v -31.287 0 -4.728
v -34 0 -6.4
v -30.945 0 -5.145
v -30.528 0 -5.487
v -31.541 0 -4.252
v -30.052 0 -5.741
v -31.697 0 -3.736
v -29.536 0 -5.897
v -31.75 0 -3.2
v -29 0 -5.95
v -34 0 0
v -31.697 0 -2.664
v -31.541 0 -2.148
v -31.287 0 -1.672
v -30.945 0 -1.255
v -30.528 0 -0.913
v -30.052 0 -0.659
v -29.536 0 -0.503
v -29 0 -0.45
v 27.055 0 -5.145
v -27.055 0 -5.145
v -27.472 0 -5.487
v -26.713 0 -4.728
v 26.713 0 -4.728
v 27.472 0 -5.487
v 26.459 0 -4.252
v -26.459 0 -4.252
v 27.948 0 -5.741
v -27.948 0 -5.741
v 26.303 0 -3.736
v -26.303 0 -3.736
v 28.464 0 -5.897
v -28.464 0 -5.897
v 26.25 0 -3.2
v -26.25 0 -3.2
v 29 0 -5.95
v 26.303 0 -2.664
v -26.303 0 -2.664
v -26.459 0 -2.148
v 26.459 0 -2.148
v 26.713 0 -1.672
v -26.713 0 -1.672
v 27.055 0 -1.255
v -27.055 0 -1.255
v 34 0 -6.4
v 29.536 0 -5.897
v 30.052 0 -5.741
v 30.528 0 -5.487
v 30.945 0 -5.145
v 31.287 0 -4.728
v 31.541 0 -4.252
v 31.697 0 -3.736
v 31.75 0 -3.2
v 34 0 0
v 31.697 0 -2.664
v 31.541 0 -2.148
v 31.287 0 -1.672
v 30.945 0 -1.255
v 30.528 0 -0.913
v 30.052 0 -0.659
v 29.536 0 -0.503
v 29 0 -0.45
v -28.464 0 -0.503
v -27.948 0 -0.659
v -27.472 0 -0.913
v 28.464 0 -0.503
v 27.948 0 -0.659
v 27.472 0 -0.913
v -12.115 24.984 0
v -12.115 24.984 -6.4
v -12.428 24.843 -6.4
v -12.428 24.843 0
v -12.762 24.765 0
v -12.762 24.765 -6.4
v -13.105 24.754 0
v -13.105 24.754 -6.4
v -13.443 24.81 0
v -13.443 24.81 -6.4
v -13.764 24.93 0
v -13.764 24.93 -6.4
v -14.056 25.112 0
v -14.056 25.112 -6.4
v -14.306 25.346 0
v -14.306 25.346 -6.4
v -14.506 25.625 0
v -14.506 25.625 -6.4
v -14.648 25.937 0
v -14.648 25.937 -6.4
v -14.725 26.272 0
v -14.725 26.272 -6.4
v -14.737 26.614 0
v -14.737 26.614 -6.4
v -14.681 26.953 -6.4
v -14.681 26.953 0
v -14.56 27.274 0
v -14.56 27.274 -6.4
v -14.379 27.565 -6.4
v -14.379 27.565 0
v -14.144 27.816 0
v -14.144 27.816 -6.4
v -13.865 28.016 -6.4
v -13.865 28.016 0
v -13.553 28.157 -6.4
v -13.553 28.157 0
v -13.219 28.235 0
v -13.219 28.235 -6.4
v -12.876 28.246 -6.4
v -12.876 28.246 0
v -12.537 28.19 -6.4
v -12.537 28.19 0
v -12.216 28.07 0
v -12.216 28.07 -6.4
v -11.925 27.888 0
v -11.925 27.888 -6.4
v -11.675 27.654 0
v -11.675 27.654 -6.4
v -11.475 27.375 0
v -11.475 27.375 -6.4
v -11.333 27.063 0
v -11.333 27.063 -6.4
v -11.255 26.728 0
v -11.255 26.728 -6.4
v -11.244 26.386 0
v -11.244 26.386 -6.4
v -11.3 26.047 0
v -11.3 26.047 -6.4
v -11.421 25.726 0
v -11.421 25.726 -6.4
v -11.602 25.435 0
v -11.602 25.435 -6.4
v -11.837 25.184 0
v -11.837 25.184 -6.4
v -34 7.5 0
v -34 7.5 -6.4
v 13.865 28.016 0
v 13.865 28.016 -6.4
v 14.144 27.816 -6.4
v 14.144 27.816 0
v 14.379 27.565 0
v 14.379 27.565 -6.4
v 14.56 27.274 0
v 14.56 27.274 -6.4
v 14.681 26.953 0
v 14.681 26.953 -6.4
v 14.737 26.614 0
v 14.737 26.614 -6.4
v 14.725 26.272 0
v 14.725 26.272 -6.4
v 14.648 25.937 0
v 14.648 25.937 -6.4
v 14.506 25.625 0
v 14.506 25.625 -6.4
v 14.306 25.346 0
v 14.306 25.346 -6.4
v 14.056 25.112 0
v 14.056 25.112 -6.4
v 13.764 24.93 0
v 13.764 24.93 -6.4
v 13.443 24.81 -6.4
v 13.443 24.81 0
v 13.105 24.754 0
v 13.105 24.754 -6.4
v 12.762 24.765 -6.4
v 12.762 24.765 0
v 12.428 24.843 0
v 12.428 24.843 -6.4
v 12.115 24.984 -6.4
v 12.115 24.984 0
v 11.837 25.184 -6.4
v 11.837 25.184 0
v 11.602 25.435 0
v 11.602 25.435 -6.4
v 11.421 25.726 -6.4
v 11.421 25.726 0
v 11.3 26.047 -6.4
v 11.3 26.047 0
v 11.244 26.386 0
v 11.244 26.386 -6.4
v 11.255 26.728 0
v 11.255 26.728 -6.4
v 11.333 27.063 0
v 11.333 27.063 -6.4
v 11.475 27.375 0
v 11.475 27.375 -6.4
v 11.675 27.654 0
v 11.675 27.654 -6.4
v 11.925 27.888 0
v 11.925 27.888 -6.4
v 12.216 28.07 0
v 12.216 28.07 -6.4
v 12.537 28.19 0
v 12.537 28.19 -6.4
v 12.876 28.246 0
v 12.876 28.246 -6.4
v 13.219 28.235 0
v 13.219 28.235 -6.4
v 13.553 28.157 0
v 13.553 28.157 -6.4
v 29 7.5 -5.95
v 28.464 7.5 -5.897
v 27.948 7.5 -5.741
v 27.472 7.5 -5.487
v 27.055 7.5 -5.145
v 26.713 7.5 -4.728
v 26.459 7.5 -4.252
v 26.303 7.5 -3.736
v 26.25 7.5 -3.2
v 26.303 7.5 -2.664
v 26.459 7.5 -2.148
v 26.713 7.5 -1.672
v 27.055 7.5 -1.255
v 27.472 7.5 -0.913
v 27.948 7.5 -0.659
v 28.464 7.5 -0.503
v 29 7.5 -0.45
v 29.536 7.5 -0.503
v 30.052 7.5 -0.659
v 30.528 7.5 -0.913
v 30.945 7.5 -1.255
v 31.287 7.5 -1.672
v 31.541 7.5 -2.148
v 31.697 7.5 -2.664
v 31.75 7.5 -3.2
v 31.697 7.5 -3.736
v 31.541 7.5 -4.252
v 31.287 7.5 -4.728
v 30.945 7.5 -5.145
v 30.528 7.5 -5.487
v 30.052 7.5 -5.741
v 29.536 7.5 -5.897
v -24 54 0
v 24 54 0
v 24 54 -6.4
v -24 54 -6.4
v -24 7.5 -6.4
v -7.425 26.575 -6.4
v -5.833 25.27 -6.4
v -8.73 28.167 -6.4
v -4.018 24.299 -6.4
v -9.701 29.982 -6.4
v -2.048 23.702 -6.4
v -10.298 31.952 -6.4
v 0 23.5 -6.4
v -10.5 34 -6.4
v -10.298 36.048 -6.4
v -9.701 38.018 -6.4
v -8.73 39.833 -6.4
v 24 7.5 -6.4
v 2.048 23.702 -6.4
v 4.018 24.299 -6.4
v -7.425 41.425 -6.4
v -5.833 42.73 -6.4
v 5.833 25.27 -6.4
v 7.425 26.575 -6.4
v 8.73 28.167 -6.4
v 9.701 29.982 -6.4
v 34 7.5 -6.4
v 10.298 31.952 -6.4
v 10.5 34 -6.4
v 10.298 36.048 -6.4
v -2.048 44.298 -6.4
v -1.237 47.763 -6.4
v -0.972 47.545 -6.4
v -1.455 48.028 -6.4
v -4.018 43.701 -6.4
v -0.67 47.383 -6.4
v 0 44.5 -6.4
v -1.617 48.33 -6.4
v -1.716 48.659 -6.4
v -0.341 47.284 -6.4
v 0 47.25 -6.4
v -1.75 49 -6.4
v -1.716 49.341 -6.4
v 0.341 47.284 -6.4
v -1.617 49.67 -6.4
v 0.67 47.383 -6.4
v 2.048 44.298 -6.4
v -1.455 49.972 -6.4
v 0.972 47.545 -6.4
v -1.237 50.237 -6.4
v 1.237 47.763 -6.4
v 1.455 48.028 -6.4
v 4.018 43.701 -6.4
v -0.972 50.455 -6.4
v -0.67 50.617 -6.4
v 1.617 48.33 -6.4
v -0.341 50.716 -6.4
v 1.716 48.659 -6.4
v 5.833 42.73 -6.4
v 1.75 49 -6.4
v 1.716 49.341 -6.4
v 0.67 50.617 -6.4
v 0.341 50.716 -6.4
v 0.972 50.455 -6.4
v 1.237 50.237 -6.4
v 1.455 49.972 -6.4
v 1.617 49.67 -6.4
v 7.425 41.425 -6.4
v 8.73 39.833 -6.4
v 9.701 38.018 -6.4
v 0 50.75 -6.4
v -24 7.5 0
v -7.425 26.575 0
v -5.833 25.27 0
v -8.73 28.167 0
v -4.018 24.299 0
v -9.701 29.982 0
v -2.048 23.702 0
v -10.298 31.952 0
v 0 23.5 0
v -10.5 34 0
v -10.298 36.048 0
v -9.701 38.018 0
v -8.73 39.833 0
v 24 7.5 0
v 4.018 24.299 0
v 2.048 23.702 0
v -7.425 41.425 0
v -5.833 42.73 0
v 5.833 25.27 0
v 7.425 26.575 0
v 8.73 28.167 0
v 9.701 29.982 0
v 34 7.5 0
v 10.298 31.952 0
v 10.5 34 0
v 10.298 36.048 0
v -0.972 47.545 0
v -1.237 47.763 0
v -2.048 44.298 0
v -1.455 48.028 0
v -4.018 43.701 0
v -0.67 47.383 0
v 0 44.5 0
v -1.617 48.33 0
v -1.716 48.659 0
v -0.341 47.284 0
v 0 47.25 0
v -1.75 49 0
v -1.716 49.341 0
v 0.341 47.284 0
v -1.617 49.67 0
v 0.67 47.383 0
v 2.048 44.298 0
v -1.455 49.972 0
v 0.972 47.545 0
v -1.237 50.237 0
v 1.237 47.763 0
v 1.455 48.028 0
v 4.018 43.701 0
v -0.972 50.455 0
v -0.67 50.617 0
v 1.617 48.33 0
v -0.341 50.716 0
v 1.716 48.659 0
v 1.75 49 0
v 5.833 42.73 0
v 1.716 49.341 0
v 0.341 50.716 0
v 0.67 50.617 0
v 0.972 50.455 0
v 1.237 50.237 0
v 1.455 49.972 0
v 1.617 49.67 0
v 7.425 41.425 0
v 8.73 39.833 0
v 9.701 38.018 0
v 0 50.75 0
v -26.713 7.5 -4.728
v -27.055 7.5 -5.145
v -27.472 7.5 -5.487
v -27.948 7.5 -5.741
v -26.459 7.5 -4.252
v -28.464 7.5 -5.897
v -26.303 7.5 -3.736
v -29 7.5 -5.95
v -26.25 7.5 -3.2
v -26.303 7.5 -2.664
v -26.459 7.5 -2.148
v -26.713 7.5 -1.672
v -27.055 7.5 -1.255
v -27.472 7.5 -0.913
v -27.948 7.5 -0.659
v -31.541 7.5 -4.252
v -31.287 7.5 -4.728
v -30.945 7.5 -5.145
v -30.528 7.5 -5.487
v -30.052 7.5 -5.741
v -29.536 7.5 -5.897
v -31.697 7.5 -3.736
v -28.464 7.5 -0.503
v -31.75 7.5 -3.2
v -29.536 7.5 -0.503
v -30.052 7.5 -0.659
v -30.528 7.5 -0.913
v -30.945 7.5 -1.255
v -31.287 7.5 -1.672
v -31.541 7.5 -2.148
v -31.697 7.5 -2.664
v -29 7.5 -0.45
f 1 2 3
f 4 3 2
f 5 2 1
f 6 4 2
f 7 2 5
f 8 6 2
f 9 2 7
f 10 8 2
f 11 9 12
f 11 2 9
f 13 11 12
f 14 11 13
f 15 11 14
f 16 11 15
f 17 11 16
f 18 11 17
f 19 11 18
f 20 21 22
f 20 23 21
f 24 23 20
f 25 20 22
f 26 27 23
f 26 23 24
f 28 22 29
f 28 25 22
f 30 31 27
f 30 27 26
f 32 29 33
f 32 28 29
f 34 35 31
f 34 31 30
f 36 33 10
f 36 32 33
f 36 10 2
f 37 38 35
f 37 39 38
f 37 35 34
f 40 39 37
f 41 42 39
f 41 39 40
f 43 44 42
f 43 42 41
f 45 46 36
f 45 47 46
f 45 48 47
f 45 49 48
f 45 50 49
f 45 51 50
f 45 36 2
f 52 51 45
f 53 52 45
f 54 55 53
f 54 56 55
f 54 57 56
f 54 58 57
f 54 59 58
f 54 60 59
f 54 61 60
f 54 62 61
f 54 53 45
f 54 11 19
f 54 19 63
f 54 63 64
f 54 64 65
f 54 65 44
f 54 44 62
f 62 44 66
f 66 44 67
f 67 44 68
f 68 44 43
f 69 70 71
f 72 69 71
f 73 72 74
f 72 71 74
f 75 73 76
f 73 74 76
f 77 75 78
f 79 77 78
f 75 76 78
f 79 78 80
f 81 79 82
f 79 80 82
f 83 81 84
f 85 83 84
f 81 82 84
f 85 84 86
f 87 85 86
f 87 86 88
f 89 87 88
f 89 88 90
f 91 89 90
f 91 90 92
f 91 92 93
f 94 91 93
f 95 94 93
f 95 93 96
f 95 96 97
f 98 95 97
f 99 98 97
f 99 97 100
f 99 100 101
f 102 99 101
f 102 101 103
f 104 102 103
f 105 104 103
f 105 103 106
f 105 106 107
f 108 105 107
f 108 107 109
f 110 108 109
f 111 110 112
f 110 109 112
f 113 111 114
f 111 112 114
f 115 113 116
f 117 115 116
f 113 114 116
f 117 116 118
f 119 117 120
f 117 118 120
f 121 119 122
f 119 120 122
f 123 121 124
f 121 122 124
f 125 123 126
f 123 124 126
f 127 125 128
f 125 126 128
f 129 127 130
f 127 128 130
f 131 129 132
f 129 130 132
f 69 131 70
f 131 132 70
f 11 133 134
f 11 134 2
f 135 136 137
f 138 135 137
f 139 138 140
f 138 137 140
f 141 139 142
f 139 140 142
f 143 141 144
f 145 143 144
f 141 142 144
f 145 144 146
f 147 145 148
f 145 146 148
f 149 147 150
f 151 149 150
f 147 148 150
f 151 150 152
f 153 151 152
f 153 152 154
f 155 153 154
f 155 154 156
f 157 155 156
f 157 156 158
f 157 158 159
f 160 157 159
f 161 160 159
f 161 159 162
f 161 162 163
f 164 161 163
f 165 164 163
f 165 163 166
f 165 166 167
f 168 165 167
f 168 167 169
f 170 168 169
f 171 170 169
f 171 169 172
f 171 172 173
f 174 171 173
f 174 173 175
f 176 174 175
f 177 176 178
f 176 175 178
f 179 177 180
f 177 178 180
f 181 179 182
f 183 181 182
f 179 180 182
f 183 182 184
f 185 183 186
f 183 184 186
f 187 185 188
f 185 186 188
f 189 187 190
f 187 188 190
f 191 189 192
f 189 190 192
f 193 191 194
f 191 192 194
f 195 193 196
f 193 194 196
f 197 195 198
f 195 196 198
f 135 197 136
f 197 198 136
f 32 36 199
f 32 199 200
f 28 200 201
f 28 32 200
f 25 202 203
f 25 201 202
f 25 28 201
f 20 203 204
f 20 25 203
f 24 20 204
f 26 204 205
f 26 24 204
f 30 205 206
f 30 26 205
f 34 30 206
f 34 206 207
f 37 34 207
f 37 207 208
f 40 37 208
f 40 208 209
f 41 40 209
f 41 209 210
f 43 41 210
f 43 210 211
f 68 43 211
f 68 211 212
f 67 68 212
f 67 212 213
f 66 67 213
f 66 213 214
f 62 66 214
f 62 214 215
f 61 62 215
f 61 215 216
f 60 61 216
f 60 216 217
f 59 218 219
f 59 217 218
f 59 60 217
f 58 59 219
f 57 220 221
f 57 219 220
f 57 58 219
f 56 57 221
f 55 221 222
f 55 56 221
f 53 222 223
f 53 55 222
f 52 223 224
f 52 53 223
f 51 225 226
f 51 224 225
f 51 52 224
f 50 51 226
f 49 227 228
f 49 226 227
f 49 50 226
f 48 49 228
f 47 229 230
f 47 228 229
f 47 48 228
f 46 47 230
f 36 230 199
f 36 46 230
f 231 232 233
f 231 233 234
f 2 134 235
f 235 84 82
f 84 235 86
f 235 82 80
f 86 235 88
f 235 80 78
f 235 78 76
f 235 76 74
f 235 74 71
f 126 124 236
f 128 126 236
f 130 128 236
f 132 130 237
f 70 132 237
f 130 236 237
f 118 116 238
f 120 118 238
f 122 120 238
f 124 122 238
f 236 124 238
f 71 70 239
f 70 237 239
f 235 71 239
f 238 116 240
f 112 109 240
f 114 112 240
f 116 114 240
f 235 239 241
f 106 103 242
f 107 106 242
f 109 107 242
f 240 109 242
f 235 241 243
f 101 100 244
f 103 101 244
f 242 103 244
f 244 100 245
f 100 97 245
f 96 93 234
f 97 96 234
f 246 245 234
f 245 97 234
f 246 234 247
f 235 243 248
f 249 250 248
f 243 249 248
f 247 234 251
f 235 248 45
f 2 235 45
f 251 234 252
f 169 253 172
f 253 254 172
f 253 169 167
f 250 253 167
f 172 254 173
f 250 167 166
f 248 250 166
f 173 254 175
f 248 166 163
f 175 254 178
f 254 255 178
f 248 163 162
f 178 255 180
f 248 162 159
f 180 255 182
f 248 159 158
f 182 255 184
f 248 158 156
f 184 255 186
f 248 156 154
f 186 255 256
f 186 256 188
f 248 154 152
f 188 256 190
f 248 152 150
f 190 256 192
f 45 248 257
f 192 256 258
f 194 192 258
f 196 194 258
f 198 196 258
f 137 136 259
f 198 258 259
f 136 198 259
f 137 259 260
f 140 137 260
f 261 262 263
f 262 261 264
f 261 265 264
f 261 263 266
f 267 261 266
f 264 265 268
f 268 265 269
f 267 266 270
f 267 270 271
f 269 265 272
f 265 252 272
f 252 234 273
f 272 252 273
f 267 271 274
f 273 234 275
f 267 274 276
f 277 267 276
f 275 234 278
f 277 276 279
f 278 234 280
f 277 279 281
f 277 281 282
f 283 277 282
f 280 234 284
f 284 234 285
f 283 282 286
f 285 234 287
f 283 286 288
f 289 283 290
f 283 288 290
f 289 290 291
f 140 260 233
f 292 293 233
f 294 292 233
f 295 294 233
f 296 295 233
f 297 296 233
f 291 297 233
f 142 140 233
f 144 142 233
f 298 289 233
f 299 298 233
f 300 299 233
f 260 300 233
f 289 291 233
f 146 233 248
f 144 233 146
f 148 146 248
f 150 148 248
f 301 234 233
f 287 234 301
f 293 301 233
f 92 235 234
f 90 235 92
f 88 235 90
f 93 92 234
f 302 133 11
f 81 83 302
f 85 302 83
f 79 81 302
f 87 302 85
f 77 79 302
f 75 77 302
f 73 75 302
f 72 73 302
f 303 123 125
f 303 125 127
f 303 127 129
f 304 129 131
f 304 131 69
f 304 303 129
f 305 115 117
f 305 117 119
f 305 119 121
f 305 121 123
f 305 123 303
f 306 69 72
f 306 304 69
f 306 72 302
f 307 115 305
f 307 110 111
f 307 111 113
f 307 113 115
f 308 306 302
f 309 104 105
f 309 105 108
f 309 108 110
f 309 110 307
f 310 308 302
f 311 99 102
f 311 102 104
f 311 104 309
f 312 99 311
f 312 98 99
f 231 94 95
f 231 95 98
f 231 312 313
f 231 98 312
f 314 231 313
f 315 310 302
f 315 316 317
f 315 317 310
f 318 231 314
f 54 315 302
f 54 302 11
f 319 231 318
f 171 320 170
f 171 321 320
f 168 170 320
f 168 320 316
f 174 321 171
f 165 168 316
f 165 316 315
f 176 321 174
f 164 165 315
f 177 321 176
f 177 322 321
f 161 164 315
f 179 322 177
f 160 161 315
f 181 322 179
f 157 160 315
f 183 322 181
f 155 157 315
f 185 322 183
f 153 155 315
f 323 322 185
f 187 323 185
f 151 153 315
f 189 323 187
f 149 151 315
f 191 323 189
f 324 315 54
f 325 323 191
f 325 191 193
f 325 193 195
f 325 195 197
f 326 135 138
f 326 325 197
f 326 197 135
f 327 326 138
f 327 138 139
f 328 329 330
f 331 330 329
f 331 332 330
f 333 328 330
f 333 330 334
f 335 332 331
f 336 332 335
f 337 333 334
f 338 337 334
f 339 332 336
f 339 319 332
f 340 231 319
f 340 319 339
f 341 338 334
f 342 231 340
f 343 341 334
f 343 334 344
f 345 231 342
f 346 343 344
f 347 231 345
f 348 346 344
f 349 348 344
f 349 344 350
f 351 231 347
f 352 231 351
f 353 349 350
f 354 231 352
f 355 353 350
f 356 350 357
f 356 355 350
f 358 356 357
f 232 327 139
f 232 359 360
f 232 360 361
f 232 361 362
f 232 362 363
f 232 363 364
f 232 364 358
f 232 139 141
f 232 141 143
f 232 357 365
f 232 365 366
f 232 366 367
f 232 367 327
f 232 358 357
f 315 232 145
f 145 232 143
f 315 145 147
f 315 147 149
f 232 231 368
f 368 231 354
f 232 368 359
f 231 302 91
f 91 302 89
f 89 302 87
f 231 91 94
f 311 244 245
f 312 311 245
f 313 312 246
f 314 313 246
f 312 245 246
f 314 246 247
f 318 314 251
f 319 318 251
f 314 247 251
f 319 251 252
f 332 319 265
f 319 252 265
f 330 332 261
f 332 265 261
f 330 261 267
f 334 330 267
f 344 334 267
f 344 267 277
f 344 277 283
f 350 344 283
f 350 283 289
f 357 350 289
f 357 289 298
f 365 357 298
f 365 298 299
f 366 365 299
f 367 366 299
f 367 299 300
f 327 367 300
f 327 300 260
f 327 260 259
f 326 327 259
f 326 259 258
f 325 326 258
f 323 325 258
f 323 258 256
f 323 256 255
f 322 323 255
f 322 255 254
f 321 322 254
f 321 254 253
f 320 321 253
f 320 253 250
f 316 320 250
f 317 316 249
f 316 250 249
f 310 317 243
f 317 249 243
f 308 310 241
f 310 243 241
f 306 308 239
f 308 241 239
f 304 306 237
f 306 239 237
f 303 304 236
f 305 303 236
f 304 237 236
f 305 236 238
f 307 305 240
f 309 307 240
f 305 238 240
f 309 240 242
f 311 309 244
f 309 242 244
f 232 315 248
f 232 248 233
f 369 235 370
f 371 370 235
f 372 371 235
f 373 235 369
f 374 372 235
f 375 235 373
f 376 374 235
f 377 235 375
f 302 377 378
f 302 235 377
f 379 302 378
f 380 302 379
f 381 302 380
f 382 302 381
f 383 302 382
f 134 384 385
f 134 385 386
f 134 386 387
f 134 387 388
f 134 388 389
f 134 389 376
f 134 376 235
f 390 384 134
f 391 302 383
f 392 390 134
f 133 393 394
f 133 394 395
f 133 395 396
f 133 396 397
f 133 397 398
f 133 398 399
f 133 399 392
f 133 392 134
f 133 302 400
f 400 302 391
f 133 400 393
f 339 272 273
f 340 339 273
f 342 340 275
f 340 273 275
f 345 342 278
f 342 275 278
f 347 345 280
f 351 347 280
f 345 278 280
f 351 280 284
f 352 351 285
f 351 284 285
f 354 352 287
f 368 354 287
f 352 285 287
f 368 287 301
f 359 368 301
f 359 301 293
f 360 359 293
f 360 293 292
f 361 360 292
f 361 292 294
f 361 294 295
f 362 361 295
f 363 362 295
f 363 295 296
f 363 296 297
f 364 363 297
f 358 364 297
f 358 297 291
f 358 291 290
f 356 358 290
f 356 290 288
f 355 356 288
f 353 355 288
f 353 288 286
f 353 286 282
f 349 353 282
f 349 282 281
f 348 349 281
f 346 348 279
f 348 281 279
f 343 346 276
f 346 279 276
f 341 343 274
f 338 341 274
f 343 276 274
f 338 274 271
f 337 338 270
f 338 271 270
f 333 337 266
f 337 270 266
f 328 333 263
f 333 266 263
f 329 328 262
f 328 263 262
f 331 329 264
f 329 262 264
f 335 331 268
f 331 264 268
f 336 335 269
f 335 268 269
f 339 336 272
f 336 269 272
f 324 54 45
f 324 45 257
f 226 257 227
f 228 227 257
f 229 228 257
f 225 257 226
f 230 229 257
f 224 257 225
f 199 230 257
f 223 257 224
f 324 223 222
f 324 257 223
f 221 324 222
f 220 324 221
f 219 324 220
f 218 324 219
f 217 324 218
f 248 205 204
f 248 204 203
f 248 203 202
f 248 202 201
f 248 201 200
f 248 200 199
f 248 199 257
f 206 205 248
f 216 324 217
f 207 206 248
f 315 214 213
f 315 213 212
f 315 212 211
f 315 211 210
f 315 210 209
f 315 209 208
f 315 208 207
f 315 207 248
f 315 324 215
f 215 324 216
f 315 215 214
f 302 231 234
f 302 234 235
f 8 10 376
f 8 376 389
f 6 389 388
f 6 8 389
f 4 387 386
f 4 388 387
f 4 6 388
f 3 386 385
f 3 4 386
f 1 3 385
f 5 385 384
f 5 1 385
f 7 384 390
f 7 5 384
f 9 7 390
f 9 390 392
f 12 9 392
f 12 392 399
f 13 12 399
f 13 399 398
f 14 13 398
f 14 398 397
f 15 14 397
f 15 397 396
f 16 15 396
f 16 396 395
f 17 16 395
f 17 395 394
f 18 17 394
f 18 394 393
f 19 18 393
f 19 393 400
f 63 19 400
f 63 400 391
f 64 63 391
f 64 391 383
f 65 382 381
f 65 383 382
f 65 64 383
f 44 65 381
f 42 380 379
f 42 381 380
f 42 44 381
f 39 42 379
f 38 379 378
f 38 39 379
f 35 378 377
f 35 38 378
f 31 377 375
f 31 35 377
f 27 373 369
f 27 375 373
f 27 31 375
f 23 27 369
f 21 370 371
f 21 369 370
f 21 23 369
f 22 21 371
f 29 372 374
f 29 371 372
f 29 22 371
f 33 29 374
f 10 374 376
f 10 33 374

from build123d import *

# Parameters (mm, degrees)
SKETCH2_R                  = 4.175
BOSS_EXTRUDE1_DEPTH        = 6.4
SKETCH3_R                  = 10.5
CUT_EXTRUDE1_DEPTH         = 65.132363125
F_3_5_3_5_DIAMETER_HOLE1_D = 3.5
CIRPATTERN1_COUNT          = 3
CUT_EXTRUDE2_DEPTH         = 58.958692187
CUT_EXTRUDE2_DEPTH_BACK    = 58.958692187
SKETCH12_R                 = 2.75


with BuildPart() as part:
    # Sketch2 → Boss-Extrude1 (new body)
    with BuildSketch(Plane.XY):
        Polygon((-34, 0), (34, 0), (34, 7.5), (24, 7.5), (24, 54), (-24, 54), (-24, 7.5), (-34, 7.5), align=None)
        with Locations((0, 34)):
            Circle(SKETCH2_R, mode=Mode.SUBTRACT)
    extrude(amount=-BOSS_EXTRUDE1_DEPTH)

    # Sketch3 → Cut-Extrude1 (cut, through all)
    with BuildSketch(Plane(origin=(0, 0, -6.4), x_dir=(-1, 0, 0), z_dir=(0, 0, -1))):
        with Locations((0, 34)):
            Circle(SKETCH3_R)
    extrude(amount=-CUT_EXTRUDE1_DEPTH, mode=Mode.SUBTRACT)

    # Ø3.5 (3.5) Diameter Hole1 (through all)
    with Locations(Plane.XY):
        with Locations((0, 49)):
            f_3_5_3_5_diameter_hole1 = Hole(F_3_5_3_5_DIAMETER_HOLE1_D / 2)

    # CirPattern1: Ø3.5 (3.5) Diameter Hole1 ×3 about axis
    cirpattern1_axis = Axis((0, 34, 0), (0, 0, 1))
    for i in range(1, CIRPATTERN1_COUNT):
        add(f_3_5_3_5_diameter_hole1.rotate(cirpattern1_axis, i * 360 / CIRPATTERN1_COUNT), mode=Mode.SUBTRACT)

    # Sketch12 → Cut-Extrude2 (cut, two sides: drawn at the far end of the back side and taken through both)
    with BuildSketch(Plane(origin=(0, 7.5, 0), x_dir=(1, 0, 0), z_dir=(0, 1, 0)).offset(-CUT_EXTRUDE2_DEPTH_BACK)):
        with Locations(Location((-29, 3.2, 0), (0, 0, 90))):
            Circle(SKETCH12_R)
        with Locations(Location((29, 3.2, 0), (0, 0, 90))):
            Circle(SKETCH12_R)
    extrude(amount=CUT_EXTRUDE2_DEPTH + CUT_EXTRUDE2_DEPTH_BACK, mode=Mode.SUBTRACT)


solid = part.part
